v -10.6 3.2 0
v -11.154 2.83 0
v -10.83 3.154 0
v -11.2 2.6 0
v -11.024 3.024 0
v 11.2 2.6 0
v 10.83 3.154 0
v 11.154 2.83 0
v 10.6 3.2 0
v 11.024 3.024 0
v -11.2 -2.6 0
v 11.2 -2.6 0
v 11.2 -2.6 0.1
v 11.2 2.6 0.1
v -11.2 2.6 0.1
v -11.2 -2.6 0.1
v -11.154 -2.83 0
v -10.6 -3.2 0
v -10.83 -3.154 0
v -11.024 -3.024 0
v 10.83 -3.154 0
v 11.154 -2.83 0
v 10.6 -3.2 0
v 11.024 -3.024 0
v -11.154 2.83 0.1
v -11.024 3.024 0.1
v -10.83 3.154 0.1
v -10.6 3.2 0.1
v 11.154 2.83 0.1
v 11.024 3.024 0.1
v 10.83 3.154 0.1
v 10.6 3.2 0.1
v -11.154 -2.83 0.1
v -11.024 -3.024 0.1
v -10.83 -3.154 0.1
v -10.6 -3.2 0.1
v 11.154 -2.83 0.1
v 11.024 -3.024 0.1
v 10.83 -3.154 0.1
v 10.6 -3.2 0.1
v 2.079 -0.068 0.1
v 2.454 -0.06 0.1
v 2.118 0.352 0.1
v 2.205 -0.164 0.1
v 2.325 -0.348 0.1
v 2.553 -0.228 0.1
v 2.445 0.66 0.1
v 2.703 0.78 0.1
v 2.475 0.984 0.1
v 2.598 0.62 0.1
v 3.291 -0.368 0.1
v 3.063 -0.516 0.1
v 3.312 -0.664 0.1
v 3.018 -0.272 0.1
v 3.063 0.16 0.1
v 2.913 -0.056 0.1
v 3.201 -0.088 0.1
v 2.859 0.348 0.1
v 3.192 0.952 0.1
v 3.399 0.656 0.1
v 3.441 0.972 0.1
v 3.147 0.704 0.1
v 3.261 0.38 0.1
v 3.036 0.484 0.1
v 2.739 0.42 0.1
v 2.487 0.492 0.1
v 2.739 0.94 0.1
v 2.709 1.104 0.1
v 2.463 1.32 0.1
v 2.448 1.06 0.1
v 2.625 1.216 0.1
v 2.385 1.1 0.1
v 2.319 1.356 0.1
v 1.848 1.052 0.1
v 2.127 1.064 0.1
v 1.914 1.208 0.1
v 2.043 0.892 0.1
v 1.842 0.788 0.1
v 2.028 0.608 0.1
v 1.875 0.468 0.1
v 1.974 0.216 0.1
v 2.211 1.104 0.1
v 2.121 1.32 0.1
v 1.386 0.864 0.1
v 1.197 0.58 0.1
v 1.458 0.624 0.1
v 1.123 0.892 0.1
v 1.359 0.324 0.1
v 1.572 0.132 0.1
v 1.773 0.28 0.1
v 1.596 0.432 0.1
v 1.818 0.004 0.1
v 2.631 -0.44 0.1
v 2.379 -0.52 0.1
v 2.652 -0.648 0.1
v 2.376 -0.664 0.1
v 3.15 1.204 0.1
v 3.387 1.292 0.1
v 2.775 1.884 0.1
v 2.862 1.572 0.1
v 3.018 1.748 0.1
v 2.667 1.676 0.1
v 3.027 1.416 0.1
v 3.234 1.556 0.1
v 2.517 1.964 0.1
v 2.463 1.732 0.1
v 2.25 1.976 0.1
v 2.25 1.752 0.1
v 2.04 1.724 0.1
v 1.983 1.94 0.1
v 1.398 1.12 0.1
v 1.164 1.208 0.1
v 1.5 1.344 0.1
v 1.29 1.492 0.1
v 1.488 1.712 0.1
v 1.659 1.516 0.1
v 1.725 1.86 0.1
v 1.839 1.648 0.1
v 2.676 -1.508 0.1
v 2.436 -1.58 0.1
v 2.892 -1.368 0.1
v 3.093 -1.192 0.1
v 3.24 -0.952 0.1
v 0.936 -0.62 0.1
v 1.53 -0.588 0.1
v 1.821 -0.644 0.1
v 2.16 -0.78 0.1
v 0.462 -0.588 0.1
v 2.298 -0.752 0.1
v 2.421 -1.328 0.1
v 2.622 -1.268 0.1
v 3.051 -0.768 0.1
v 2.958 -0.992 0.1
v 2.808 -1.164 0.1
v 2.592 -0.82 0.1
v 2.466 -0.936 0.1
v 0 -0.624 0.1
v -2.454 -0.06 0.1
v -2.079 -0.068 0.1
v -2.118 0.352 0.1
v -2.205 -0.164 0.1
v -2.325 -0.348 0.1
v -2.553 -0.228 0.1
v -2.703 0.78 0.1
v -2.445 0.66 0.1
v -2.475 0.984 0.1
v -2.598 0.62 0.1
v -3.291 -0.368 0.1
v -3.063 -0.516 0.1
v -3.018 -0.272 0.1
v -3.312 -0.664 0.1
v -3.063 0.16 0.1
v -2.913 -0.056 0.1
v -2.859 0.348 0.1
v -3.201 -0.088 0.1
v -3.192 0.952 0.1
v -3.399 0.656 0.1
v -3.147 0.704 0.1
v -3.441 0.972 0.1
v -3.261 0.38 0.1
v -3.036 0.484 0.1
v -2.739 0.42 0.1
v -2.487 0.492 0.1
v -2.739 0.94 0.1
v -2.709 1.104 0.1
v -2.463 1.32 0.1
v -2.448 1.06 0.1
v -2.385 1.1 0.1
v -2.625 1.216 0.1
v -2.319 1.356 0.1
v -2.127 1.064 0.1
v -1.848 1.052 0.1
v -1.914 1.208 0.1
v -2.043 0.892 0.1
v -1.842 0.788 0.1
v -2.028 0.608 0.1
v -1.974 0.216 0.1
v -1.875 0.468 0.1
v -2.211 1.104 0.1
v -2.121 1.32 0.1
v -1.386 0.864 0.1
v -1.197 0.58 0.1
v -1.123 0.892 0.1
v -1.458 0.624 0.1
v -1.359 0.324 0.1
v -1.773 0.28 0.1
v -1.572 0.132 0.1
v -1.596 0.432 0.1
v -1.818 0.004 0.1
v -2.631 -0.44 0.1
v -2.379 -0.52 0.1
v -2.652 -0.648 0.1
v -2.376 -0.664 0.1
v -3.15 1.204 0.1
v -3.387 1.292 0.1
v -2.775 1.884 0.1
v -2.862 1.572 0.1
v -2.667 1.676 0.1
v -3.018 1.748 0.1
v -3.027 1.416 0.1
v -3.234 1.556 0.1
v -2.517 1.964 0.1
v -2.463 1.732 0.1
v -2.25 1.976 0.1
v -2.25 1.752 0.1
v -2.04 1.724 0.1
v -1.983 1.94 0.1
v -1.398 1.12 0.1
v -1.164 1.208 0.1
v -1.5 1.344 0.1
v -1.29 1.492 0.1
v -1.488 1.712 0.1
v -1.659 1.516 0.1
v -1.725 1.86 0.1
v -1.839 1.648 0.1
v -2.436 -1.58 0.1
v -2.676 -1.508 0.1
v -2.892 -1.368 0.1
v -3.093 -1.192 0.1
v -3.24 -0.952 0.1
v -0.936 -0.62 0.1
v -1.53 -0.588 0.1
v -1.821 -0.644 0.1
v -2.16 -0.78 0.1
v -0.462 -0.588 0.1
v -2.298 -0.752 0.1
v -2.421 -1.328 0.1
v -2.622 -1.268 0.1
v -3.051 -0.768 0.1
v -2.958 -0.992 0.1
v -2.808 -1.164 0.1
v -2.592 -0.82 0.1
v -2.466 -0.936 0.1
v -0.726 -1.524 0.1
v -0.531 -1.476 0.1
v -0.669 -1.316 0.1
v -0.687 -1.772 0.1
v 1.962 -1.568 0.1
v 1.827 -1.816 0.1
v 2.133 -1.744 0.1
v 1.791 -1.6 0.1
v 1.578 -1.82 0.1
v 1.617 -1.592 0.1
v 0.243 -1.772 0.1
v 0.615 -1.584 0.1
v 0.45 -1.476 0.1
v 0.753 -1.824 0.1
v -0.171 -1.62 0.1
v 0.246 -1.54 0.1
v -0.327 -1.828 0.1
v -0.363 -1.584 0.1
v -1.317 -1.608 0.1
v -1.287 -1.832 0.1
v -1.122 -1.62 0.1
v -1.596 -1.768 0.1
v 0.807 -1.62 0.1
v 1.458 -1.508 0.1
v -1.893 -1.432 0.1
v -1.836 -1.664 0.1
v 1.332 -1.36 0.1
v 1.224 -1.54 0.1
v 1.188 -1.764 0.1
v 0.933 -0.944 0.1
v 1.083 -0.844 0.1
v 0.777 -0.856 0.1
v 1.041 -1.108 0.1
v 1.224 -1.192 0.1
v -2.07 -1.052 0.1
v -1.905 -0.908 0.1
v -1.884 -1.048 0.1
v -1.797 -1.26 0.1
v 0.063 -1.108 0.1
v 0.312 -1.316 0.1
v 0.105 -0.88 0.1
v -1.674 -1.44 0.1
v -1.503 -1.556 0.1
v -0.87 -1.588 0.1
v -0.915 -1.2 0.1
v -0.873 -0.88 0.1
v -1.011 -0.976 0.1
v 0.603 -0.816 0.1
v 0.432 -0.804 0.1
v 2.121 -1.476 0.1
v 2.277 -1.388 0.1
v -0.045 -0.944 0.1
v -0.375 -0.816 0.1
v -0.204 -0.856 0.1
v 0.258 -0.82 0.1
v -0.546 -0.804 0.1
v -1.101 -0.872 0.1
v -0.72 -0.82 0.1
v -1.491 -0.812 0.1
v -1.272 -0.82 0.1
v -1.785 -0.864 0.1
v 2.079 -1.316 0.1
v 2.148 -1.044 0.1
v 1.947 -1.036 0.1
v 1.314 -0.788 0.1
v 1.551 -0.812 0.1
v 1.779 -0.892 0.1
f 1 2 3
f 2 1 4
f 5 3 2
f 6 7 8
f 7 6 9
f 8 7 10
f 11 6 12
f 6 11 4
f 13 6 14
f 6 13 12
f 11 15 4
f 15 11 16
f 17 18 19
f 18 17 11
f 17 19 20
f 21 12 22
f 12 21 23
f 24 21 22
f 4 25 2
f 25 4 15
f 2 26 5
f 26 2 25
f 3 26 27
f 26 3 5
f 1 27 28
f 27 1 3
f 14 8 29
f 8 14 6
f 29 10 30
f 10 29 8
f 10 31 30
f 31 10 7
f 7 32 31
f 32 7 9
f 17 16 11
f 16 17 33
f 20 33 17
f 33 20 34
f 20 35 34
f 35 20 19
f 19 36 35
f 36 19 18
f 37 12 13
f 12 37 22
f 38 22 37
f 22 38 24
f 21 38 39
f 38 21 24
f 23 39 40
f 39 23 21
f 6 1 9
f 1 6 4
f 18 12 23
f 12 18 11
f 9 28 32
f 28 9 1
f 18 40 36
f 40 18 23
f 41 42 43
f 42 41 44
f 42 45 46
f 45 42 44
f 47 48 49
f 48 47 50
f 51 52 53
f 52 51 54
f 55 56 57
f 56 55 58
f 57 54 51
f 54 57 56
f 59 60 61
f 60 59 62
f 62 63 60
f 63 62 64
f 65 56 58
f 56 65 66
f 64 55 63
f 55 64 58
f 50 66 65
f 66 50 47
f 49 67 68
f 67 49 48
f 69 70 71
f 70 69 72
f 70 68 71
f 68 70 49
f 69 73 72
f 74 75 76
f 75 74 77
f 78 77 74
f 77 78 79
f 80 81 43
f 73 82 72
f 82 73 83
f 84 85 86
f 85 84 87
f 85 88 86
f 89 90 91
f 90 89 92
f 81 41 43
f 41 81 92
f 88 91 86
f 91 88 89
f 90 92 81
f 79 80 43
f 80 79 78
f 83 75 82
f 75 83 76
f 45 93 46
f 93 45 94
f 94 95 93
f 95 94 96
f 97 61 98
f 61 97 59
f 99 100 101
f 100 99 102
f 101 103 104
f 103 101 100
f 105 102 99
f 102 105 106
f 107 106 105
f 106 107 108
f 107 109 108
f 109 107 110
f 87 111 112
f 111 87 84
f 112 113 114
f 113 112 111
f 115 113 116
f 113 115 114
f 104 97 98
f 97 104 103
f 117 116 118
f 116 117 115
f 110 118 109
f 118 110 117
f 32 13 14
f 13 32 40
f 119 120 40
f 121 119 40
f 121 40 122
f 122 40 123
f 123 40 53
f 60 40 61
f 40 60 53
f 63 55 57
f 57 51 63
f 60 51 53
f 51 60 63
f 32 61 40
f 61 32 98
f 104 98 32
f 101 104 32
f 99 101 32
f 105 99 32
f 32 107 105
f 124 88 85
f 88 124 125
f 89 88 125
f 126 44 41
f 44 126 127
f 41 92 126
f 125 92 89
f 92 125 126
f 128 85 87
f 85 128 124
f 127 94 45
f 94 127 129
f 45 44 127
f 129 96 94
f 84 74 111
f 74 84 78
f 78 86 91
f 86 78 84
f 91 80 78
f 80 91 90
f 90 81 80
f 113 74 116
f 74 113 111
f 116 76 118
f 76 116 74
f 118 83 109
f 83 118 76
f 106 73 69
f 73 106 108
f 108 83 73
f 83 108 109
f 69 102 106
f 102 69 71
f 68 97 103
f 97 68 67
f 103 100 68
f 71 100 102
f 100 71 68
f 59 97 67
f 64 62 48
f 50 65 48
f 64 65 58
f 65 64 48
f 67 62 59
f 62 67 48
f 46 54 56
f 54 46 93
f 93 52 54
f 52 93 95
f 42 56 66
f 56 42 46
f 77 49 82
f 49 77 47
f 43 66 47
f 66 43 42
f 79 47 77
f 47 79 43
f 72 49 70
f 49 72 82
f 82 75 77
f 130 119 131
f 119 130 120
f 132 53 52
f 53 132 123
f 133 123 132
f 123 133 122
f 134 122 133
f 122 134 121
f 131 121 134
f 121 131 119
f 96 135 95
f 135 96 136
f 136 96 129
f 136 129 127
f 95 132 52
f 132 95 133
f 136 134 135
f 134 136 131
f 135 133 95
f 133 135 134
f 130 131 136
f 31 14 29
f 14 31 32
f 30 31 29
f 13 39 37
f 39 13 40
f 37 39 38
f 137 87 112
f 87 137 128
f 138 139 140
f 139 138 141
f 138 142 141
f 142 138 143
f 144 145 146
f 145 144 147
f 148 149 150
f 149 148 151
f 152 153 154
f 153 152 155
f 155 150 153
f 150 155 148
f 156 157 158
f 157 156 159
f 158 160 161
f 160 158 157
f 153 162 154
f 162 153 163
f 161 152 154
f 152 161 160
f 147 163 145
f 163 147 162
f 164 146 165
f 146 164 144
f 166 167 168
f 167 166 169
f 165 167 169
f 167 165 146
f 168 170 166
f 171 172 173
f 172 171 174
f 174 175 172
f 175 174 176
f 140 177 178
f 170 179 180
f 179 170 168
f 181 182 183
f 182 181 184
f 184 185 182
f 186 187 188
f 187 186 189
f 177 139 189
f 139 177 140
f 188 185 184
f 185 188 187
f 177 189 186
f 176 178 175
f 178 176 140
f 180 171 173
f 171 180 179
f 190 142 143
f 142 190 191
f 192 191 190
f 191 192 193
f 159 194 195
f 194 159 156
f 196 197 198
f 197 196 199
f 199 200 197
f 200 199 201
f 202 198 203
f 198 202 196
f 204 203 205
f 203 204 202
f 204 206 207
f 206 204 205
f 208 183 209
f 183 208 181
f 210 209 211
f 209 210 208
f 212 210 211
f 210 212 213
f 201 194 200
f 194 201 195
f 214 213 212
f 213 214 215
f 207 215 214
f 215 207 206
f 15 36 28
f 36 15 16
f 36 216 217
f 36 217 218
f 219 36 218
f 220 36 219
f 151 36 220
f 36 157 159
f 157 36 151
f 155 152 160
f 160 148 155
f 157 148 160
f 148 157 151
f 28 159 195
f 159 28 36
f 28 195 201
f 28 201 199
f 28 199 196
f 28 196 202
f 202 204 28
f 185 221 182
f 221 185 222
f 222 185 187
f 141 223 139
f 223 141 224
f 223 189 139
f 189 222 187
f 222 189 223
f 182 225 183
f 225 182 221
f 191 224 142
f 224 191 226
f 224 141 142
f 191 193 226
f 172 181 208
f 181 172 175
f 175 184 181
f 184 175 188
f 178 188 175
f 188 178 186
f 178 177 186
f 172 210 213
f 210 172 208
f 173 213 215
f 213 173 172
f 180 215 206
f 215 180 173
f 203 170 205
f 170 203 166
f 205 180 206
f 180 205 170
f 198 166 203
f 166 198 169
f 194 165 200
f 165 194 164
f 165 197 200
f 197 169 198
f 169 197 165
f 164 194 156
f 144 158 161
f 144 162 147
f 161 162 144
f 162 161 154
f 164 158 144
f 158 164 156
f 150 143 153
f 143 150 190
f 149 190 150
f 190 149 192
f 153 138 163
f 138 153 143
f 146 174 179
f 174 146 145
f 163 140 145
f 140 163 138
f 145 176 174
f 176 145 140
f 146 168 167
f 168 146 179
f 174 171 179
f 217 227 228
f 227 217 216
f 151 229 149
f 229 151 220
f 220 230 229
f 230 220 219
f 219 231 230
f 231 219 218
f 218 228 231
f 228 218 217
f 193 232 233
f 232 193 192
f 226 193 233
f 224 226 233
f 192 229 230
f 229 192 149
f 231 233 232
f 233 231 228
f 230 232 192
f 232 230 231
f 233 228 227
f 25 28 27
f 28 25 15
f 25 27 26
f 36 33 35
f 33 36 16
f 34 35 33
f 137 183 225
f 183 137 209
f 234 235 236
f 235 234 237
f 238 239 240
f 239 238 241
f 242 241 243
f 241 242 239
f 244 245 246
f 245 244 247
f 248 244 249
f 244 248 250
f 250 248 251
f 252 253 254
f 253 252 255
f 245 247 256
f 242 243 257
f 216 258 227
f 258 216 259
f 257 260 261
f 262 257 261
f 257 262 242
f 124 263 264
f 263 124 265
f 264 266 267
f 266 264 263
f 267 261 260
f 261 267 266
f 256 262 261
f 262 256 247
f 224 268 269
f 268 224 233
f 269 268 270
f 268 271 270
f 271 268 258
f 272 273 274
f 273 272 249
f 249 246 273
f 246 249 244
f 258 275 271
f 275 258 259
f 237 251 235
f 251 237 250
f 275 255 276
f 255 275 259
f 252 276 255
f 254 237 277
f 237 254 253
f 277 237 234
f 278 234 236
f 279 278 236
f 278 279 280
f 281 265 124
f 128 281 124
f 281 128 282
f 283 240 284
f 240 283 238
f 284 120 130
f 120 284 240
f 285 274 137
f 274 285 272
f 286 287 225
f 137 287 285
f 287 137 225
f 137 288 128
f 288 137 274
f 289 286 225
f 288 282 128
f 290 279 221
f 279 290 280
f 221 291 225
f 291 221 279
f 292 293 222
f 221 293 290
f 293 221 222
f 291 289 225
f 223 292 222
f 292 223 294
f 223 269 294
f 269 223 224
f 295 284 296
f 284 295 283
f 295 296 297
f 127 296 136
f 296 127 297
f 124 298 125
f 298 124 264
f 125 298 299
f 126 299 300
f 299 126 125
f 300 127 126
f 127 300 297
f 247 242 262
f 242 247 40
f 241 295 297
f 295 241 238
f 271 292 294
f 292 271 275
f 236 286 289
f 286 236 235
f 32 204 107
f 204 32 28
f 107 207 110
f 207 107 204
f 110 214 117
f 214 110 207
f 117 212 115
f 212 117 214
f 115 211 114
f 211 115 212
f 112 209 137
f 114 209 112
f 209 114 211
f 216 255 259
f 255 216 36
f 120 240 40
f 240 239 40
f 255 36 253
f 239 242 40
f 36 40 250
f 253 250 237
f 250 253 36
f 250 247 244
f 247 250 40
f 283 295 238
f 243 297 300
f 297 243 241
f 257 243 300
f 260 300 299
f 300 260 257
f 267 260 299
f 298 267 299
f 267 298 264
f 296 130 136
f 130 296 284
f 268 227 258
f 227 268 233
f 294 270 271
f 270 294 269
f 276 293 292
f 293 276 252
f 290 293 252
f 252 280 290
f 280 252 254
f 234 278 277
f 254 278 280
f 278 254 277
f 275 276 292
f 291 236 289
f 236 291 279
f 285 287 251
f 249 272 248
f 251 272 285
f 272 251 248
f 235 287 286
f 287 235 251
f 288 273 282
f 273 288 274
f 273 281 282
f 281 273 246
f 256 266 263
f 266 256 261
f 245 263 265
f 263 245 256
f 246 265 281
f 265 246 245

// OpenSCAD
// file: ../p/box3u12.scad
use <../lib.scad>
function ldraw_lib__box3u12() = [
// 0 Box with 3 Parallel Faces without Any Edges
// 0 Name: box3u12.dat
// 0 Author: J.C. Tchang [tchang]
// 0 !LDRAW_ORG Primitive UPDATE 2014-02
// 0 !LICENSE Licensed under CC BY 4.0 : see CAreadme.txt
// 
// 0 BFC CERTIFY CCW
  [0,"BFC","CERTIFY"],
  [0,"BFC","CCW"],
// 
// 0 !HISTORY 2014-12-23 [PTadmin] Official Update 2014-02
// 
// 
// 4 16 -1 1 1 1 1 1 1 1 -1 -1 1 -1
  [4,16,-1,1,1,1,1,1,1,1,-1,-1,1,-1],
// 4 16 -1 1 1 -1 0 1 1 0 1 1 1 1
  [4,16,-1,1,1,-1,0,1,1,0,1,1,1,1],
// 4 16 1 1 -1 1 0 -1 -1 0 -1 -1 1 -1
  [4,16,1,1,-1,1,0,-1,-1,0,-1,-1,1,-1],
];
module ldraw_lib__box3u12(step=0, col=false, unit=2/5, alt=false, line=0.2, solid=!$preview)
    makepoly(ldraw_lib__box3u12(), step=step, col=col, unit=unit, alt=alt, line=line, solid=solid);
ldraw_lib__box3u12(line=0.2);
// file: ../p/1-4cyli.scad
use <../lib.scad>
function ldraw_lib__1_4cyli() = [
// 0 Cylinder 0.25
// 0 Name: 1-4cyli.dat
// 0 Author: James Jessiman
// 0 !LDRAW_ORG Primitive UPDATE 2012-01
// 0 !LICENSE Licensed under CC BY 4.0 : see CAreadme.txt
// 
// 0 BFC CERTIFY CCW
  [0,"BFC","CERTIFY"],
  [0,"BFC","CCW"],
// 
// 0 !HISTORY 2002-03-23 [sbliss] Added BFC statement.
// 0 !HISTORY 2002-04-25 [PTadmin] Official Update 2002-02
// 0 !HISTORY 2007-06-22 [PTadmin] Header formatted for Contributor Agreement
// 0 !HISTORY 2008-07-01 [PTadmin] Official Update 2008-01
// 0 !HISTORY 2012-02-16 [Philo] Changed to CCW
// 0 !HISTORY 2012-03-30 [PTadmin] Official Update 2012-01
// 
// 
// 4 16 1 1 0 0.9239 1 0.3827 0.9239 0 0.3827 1 0 0
  [4,16,1,1,0,0.9239,1,0.3827,0.9239,0,0.3827,1,0,0],
// 5 24 1 0 0 1 1 0 0.9239 0 0.3827 1 0 -1
  [5,24,1,0,0,1,1,0,0.9239,0,0.3827,1,0,-1],
// 4 16 0.9239 1 0.3827 0.7071 1 0.7071 0.7071 0 0.7071 0.9239 0 0.3827
  [4,16,0.9239,1,0.3827,0.7071,1,0.7071,0.7071,0,0.7071,0.9239,0,0.3827],
// 5 24 0.9239 0 0.3827 0.9239 1 0.3827 0.7071 0 0.7071 1 0 0
  [5,24,0.9239,0,0.3827,0.9239,1,0.3827,0.7071,0,0.7071,1,0,0],
// 4 16 0.7071 1 0.7071 0.3827 1 0.9239 0.3827 0 0.9239 0.7071 0 0.7071
  [4,16,0.7071,1,0.7071,0.3827,1,0.9239,0.3827,0,0.9239,0.7071,0,0.7071],
// 5 24 0.7071 0 0.7071 0.7071 1 0.7071 0.3827 0 0.9239 0.9239 0 0.3827
  [5,24,0.7071,0,0.7071,0.7071,1,0.7071,0.3827,0,0.9239,0.9239,0,0.3827],
// 4 16 0.3827 1 0.9239 0 1 1 0 0 1 0.3827 0 0.9239
  [4,16,0.3827,1,0.9239,0,1,1,0,0,1,0.3827,0,0.9239],
// 5 24 0.3827 0 0.9239 0.3827 1 0.9239 0 0 1 0.7071 0 0.7071
  [5,24,0.3827,0,0.9239,0.3827,1,0.9239,0,0,1,0.7071,0,0.7071],
// 5 24 0 0 1 0 1 1 0.3827 0 0.9239 -1 0 1
  [5,24,0,0,1,0,1,1,0.3827,0,0.9239,-1,0,1],
];
module ldraw_lib__1_4cyli(step=0, col=false, unit=2/5, alt=false, line=0.2, solid=!$preview)
    makepoly(ldraw_lib__1_4cyli(), step=step, col=col, unit=unit, alt=alt, line=line, solid=solid);
ldraw_lib__1_4cyli(line=0.2);
// file: ../p/1-4chrd.scad
use <../lib.scad>
function ldraw_lib__1_4chrd() = [
// 0 Chord 0.25
// 0 Name: 1-4chrd.dat
// 0 Author: Max Martin Richter [MMR1988]
// 0 !LDRAW_ORG Primitive UPDATE 2023-05
// 0 !LICENSE Licensed under CC BY 4.0 : see CAreadme.txt
// 
// 0 BFC CERTIFY CCW
  [0,"BFC","CERTIFY"],
  [0,"BFC","CCW"],
// 
// 0 !HISTORY 2004-04-22 [PTadmin] Official Update 2004-02
// 0 !HISTORY 2007-10-09 [PTadmin] Header formatted for Contributor Agreement
// 0 !HISTORY 2008-07-01 [PTadmin] Official Update 2008-01
// 0 !HISTORY 2012-08-02 [MMR1988] Re-creation with PrimGen2 and Rectifier
// 0 !HISTORY 2012-08-09 [PTadmin] Official Update 2012-02
// 0 !HISTORY 2023-10-27 [OrionP] Change author to MMR1988 from hafhead
// 0 !HISTORY 2023-10-31 [OrionP] Official Update 2023-05
// 
// 4 16 0.9239 0 0.3827 0.3827 0 0.9239 0 0 1 1 0 0
  [4,16,0.9239,0,0.3827,0.3827,0,0.9239,0,0,1,1,0,0],
// 3 16 0.7071 0 0.7071 0.3827 0 0.9239 0.9239 0 0.3827
  [3,16,0.7071,0,0.7071,0.3827,0,0.9239,0.9239,0,0.3827],
];
module ldraw_lib__1_4chrd(step=0, col=false, unit=2/5, alt=false, line=0.2, solid=!$preview)
    makepoly(ldraw_lib__1_4chrd(), step=step, col=col, unit=unit, alt=alt, line=line, solid=solid);
ldraw_lib__1_4chrd(line=0.2);
// file: s/stickerback008x028.scad
use <../../lib.scad>
use <../../p/1-4chrd.scad>
use <../../p/1-4cyli.scad>
use <../../p/box3u12.scad>
function ldraw_lib__s__stickerback008x028() = [
// 0 ~Sticker Back  0.8 x  2.8
// 0 Name: s\stickerback008x028.dat
// 0 Author: Massimo Maso [Sirio]
// 0 !LDRAW_ORG Subpart UPDATE 2025-08
// 0 !LICENSE Licensed under CC BY 4.0 : see CAreadme.txt
// 
// 0 BFC CERTIFY CCW
  [0,"BFC","CERTIFY"],
  [0,"BFC","CCW"],
// 
// 0 !HISTORY 2025-08-31 [OrionP] Official Update 2025-08
// 
// 0 // Primitives
// 1 16 -26.5 0 6.5 -1.5 0 0 0 -1 0 0 0 1.5 1-4chrd.dat
  [1,16,-26.5,0,6.5,-1.5,0,0,0,-1,0,0,0,1.5, ldraw_lib__1_4chrd()],
// 1 16 26.5 0 6.5 1.5 0 0 0 -1 0 0 0 1.5 1-4chrd.dat
  [1,16,26.5,0,6.5,1.5,0,0,0,-1,0,0,0,1.5, ldraw_lib__1_4chrd()],
// 1 16 0 -.25 0 0 0 28 0 .25 0 6.5 0 0 box3u12.dat
  [1,16,0,-.25,0,0,0,28,0,.25,0,6.5,0,0, ldraw_lib__box3u12()],
// 1 16 -26.5 0 -6.5 -1.5 0 0 0 -1 0 0 0 -1.5 1-4chrd.dat
  [1,16,-26.5,0,-6.5,-1.5,0,0,0,-1,0,0,0,-1.5, ldraw_lib__1_4chrd()],
// 1 16 26.5 0 -6.5 1.5 0 0 0 -1 0 0 0 -1.5 1-4chrd.dat
  [1,16,26.5,0,-6.5,1.5,0,0,0,-1,0,0,0,-1.5, ldraw_lib__1_4chrd()],
// 1 16 -26.5 -.25 6.5 -1.5 0 0 0 .25 0 0 0 1.5 1-4cyli.dat
  [1,16,-26.5,-.25,6.5,-1.5,0,0,0,.25,0,0,0,1.5, ldraw_lib__1_4cyli()],
// 1 16 26.5 -.25 6.5 1.5 0 0 0 .25 0 0 0 1.5 1-4cyli.dat
  [1,16,26.5,-.25,6.5,1.5,0,0,0,.25,0,0,0,1.5, ldraw_lib__1_4cyli()],
// 1 16 -26.5 -.25 -6.5 -1.5 0 0 0 .25 0 0 0 -1.5 1-4cyli.dat
  [1,16,-26.5,-.25,-6.5,-1.5,0,0,0,.25,0,0,0,-1.5, ldraw_lib__1_4cyli()],
// 1 16 26.5 -.25 -6.5 1.5 0 0 0 .25 0 0 0 -1.5 1-4cyli.dat
  [1,16,26.5,-.25,-6.5,1.5,0,0,0,.25,0,0,0,-1.5, ldraw_lib__1_4cyli()],
// 0 // Bottom face
// 4 16 -28 0 6.5 -26.5 0 8 26.5 0 8 28 0 6.5
  [4,16,-28,0,6.5,-26.5,0,8,26.5,0,8,28,0,6.5],
// 4 16 -28 0 -6.5 28 0 -6.5 26.5 0 -8 -26.5 0 -8
  [4,16,-28,0,-6.5,28,0,-6.5,26.5,0,-8,-26.5,0,-8],
// 0 // Lateral face
// 4 16 26.5 0 8 -26.5 0 8 -26.5 -.25 8 26.5 -.25 8
  [4,16,26.5,0,8,-26.5,0,8,-26.5,-.25,8,26.5,-.25,8],
// 4 16 -26.5 0 -8 26.5 0 -8 26.5 -.25 -8 -26.5 -.25 -8
  [4,16,-26.5,0,-8,26.5,0,-8,26.5,-.25,-8,-26.5,-.25,-8],
];
module ldraw_lib__s__stickerback008x028(step=0, col=false, unit=2/5, alt=false, line=0.2, solid=!$preview)
    makepoly(ldraw_lib__s__stickerback008x028(), step=step, col=col, unit=unit, alt=alt, line=line, solid=solid);
ldraw_lib__s__stickerback008x028(line=0.2);
// main file
use <../lib.scad>
use <s/6521012as01.scad>
use <s/stickerback008x028.scad>
function ldraw_lib__6521012a() = [
// 0 Sticker  0.8 x  2.8 with Medium Nougat Drawer with Ornamented Gold Handle
// 0 Name: 6521012a.dat
// 0 Author: Philippe Hurbain [Philo]
// 0 !LDRAW_ORG Part UPDATE 2026-07
// 0 !LICENSE Licensed under CC BY 4.0 : see CAreadme.txt
// 
// 0 BFC CERTIFY CCW
  [0,"BFC","CERTIFY"],
  [0,"BFC","CCW"],
// 
// 0 !CATEGORY Sticker
// 0 !KEYWORDS Beekeepers' House and Flower Garden, BrickLink 42669stk01
// 0 !KEYWORDS Brickowl 447019, Rebrickable 10110453, Set 42669
// 
// 0 !HISTORY 2026-07-30 [OrionP] Official Update 2026-07
// 
// 1 16 0 0 0 1 0 0 0 1 0 0 0 1 s\stickerback008x028.dat
  [1,16,0,0,0,1,0,0,0,1,0,0,0,1, ldraw_lib__s__stickerback008x028()],
// 1 16 0 0 0 1 0 0 0 1 0 0 0 1 s\6521012as01.dat
  [1,16,0,0,0,1,0,0,0,1,0,0,0,1, ldraw_lib__s__6521012as01()],
// 1 16 0 0 0 -1 0 0 0 1 0 0 0 1 s\6521012as01.dat
  [1,16,0,0,0,-1,0,0,0,1,0,0,0,1, ldraw_lib__s__6521012as01()],
// 
// 4 272 -1.7175 -.25 -4.43 -1.3275 -.25 -3.69 -1.6725 -.25 -3.29 -1.815 -.25 -3.81
  [4,272,-1.7175,-.25,-4.43,-1.3275,-.25,-3.69,-1.6725,-.25,-3.29,-1.815,-.25,-3.81],
// 4 272 4.4775 -.25 -4 4.5675 -.25 -4.54 5.3325 -.25 -4.36 4.905 -.25 -3.92
  [4,272,4.4775,-.25,-4,4.5675,-.25,-4.54,5.3325,-.25,-4.36,4.905,-.25,-3.92],
// 4 272 4.5675 -.25 -4.54 4.4775 -.25 -4 4.0425 -.25 -3.98 3.945 -.25 -4.55
  [4,272,4.5675,-.25,-4.54,4.4775,-.25,-4,4.0425,-.25,-3.98,3.945,-.25,-4.55],
// 4 272 1.125 -.25 -3.69 .6075 -.25 -4.43 1.8825 -.25 -4.56 1.5375 -.25 -3.96
  [4,272,1.125,-.25,-3.69,.6075,-.25,-4.43,1.8825,-.25,-4.56,1.5375,-.25,-3.96],
// 4 272 .615 -.25 -3.85 -.4275 -.25 -4.05 -.8175 -.25 -4.57 .6075 -.25 -4.43
  [4,272,.615,-.25,-3.85,-.4275,-.25,-4.05,-.8175,-.25,-4.57,.6075,-.25,-4.43],
// 3 272 -.8175 -.25 -4.57 -.4275 -.25 -4.05 -.9075 -.25 -3.96
  [3,272,-.8175,-.25,-4.57,-.4275,-.25,-4.05,-.9075,-.25,-3.96],
// 4 272 -3.99 -.25 -4.42 -3.2175 -.25 -4.58 -2.805 -.25 -4.05 -3.2925 -.25 -4.02
  [4,272,-3.99,-.25,-4.42,-3.2175,-.25,-4.58,-2.805,-.25,-4.05,-3.2925,-.25,-4.02],
// 3 272 1.5375 -.25 -3.96 1.8825 -.25 -4.56 2.0175 -.25 -4.05
  [3,272,1.5375,-.25,-3.96,1.8825,-.25,-4.56,2.0175,-.25,-4.05],
// 3 272 3.945 -.25 -4.55 4.0425 -.25 -3.98 3.645 -.25 -3.77
  [3,272,3.945,-.25,-4.55,4.0425,-.25,-3.98,3.645,-.25,-3.77],
// 4 272 -4.59 -.25 -4.16 -4.7325 -.25 -3.58 -6.0525 -.25 -3.32 -6.09 -.25 -3.95
  [4,272,-4.59,-.25,-4.16,-4.7325,-.25,-3.58,-6.0525,-.25,-3.32,-6.09,-.25,-3.95],
// 3 272 3.645 -.25 -3.77 3.33 -.25 -3.4 3.06 -.25 -3.85
  [3,272,3.645,-.25,-3.77,3.33,-.25,-3.4,3.06,-.25,-3.85],
// 4 272 3.945 -.25 -4.55 3.645 -.25 -3.77 3.06 -.25 -3.85 2.97 -.25 -4.41
  [4,272,3.945,-.25,-4.55,3.645,-.25,-3.77,3.06,-.25,-3.85,2.97,-.25,-4.41],
// 4 272 2.34 -.25 -1.55 1.9425 -.25 -2.14 2.3325 -.25 -2.36 2.7075 -.25 -2.11
  [4,272,2.34,-.25,-1.55,1.9425,-.25,-2.14,2.3325,-.25,-2.36,2.7075,-.25,-2.11],
// 4 272 2.3325 -.25 -2.36 2.6025 -.25 -2.77 3.06 -.25 -2.98 2.7075 -.25 -2.11
  [4,272,2.3325,-.25,-2.36,2.6025,-.25,-2.77,3.06,-.25,-2.98,2.7075,-.25,-2.11],
// 4 272 2.6025 -.25 -2.77 3.06 -.25 -3.85 3.33 -.25 -3.4 3.06 -.25 -2.98
  [4,272,2.6025,-.25,-2.77,3.06,-.25,-3.85,3.33,-.25,-3.4,3.06,-.25,-2.98],
// 4 272 1.8825 -.25 -4.56 2.97 -.25 -4.41 3.06 -.25 -3.85 2.0175 -.25 -4.05
  [4,272,1.8825,-.25,-4.56,2.97,-.25,-4.41,3.06,-.25,-3.85,2.0175,-.25,-4.05],
// 4 272 -5.4 -.25 -1.95 -6.165 -.25 -2.34 -5.175 -.25 -2.63 -4.7625 -.25 -2.27
  [4,272,-5.4,-.25,-1.95,-6.165,-.25,-2.34,-5.175,-.25,-2.63,-4.7625,-.25,-2.27],
// 3 272 -4.7625 -.25 -2.27 -5.175 -.25 -2.63 -4.71 -.25 -2.62
  [3,272,-4.7625,-.25,-2.27,-5.175,-.25,-2.63,-4.71,-.25,-2.62],
// 4 272 -5.175 -.25 -2.63 -4.7325 -.25 -3.58 -4.4925 -.25 -3.15 -4.71 -.25 -2.62
  [4,272,-5.175,-.25,-2.63,-4.7325,-.25,-3.58,-4.4925,-.25,-3.15,-4.71,-.25,-2.62],
// 4 272 .2625 -.25 -2.2 .1575 -.25 -2.77 .615 -.25 -3.85 .78 -.25 -3.29
  [4,272,.2625,-.25,-2.2,.1575,-.25,-2.77,.615,-.25,-3.85,.78,-.25,-3.29],
// 4 272 .78 -.25 -3.29 .615 -.25 -3.85 .6075 -.25 -4.43 1.125 -.25 -3.69
  [4,272,.78,-.25,-3.29,.615,-.25,-3.85,.6075,-.25,-4.43,1.125,-.25,-3.69],
// 4 272 -4.59 -.25 -4.16 -4.185 -.25 -3.6 -4.4925 -.25 -3.15 -4.7325 -.25 -3.58
  [4,272,-4.59,-.25,-4.16,-4.185,-.25,-3.6,-4.4925,-.25,-3.15,-4.7325,-.25,-3.58],
// 4 272 -.8175 -.25 -4.57 -.9075 -.25 -3.96 -1.3275 -.25 -3.69 -1.7175 -.25 -4.43
  [4,272,-.8175,-.25,-4.57,-.9075,-.25,-3.96,-1.3275,-.25,-3.69,-1.7175,-.25,-4.43],
// 4 272 -4.59 -.25 -4.16 -3.99 -.25 -4.42 -3.7575 -.25 -3.89 -4.185 -.25 -3.6
  [4,272,-4.59,-.25,-4.16,-3.99,-.25,-4.42,-3.7575,-.25,-3.89,-4.185,-.25,-3.6],
// 3 272 -3.2925 -.25 -4.02 -3.7575 -.25 -3.89 -3.99 -.25 -4.42
  [3,272,-3.2925,-.25,-4.02,-3.7575,-.25,-3.89,-3.99,-.25,-4.42],
// 4 272 -3.2175 -.25 -4.58 -1.7175 -.25 -4.43 -2.175 -.25 -3.97 -2.805 -.25 -4.05
  [4,272,-3.2175,-.25,-4.58,-1.7175,-.25,-4.43,-2.175,-.25,-3.97,-2.805,-.25,-4.05],
// 3 272 -2.175 -.25 -3.97 -1.7175 -.25 -4.43 -1.815 -.25 -3.81
  [3,272,-2.175,-.25,-3.97,-1.7175,-.25,-4.43,-1.815,-.25,-3.81],
// 3 272 -2.2875 -.25 -3 -1.815 -.25 -3.81 -1.6725 -.25 -3.29
  [3,272,-2.2875,-.25,-3,-1.815,-.25,-3.81,-1.6725,-.25,-3.29],
// 4 272 -2.5275 -.25 -2.44 -2.2875 -.25 -3 -1.6725 -.25 -3.29 -2.1825 -.25 -2.2
  [4,272,-2.5275,-.25,-2.44,-2.2875,-.25,-3,-1.6725,-.25,-3.29,-2.1825,-.25,-2.2],
// 3 272 1.5075 -.25 -2.04 1.9425 -.25 -2.14 2.34 -.25 -1.55
  [3,272,1.5075,-.25,-2.04,1.9425,-.25,-2.14,2.34,-.25,-1.55],
// 4 272 1.08 -.25 -2.01 1.5075 -.25 -2.04 2.34 -.25 -1.55 1.155 -.25 -1.47
  [4,272,1.08,-.25,-2.01,1.5075,-.25,-2.04,2.34,-.25,-1.55,1.155,-.25,-1.47],
// 4 272 4.905 -.25 -3.92 5.3325 -.25 -4.36 5.6925 -.25 -3.47 5.3025 -.25 -3.69
  [4,272,4.905,-.25,-3.92,5.3325,-.25,-4.36,5.6925,-.25,-3.47,5.3025,-.25,-3.69],
// 4 272 6.09 -.25 -3.95 6.0525 -.25 -3.32 5.6925 -.25 -3.47 5.3325 -.25 -4.36
  [4,272,6.09,-.25,-3.95,6.0525,-.25,-3.32,5.6925,-.25,-3.47,5.3325,-.25,-4.36],
// 4 272 .1575 -.25 -2.77 .2625 -.25 -2.2 0 -.25 -1.56 -.1125 -.25 -2.36
  [4,272,.1575,-.25,-2.77,.2625,-.25,-2.2,0,-.25,-1.56,-.1125,-.25,-2.36],
// 3 272 -.9375 -.25 -2.04 -.51 -.25 -2.14 -1.155 -.25 -1.47
  [3,272,-.9375,-.25,-2.04,-.51,-.25,-2.14,-1.155,-.25,-1.47],
// 4 272 -.1125 -.25 -2.36 0 -.25 -1.56 -1.155 -.25 -1.47 -.51 -.25 -2.14
  [4,272,-.1125,-.25,-2.36,0,-.25,-1.56,-1.155,-.25,-1.47,-.51,-.25,-2.14],
// 4 272 1.155 -.25 -1.47 0 -.25 -1.56 .2625 -.25 -2.2 .645 -.25 -2.05
  [4,272,1.155,-.25,-1.47,0,-.25,-1.56,.2625,-.25,-2.2,.645,-.25,-2.05],
// 3 272 -1.365 -.25 -2.01 -.9375 -.25 -2.04 -1.155 -.25 -1.47
  [3,272,-1.365,-.25,-2.01,-.9375,-.25,-2.04,-1.155,-.25,-1.47],
// 3 272 .645 -.25 -2.05 1.08 -.25 -2.01 1.155 -.25 -1.47
  [3,272,.645,-.25,-2.05,1.08,-.25,-2.01,1.155,-.25,-1.47],
// 4 272 -2.5275 -.25 -2.44 -2.1825 -.25 -2.2 -2.34 -.25 -1.55 -2.7525 -.25 -2.18
  [4,272,-2.5275,-.25,-2.44,-2.1825,-.25,-2.2,-2.34,-.25,-1.55,-2.7525,-.25,-2.18],
// 4 272 -1.155 -.25 -1.47 -2.34 -.25 -1.55 -2.1825 -.25 -2.2 -1.8 -.25 -2.05
  [4,272,-1.155,-.25,-1.47,-2.34,-.25,-1.55,-2.1825,-.25,-2.2,-1.8,-.25,-2.05],
// 3 272 -3.7275 -.25 -2.03 -3.18 -.25 -2.05 -3.825 -.25 -1.47
  [3,272,-3.7275,-.25,-2.03,-3.18,-.25,-2.05,-3.825,-.25,-1.47],
// 4 272 -2.7525 -.25 -2.18 -2.34 -.25 -1.55 -3.825 -.25 -1.47 -3.18 -.25 -2.05
  [4,272,-2.7525,-.25,-2.18,-2.34,-.25,-1.55,-3.825,-.25,-1.47,-3.18,-.25,-2.05],
// 3 272 -1.8 -.25 -2.05 -1.365 -.25 -2.01 -1.155 -.25 -1.47
  [3,272,-1.8,-.25,-2.05,-1.365,-.25,-2.01,-1.155,-.25,-1.47],
// 4 272 -4.5525 -.25 -1.61 -4.4625 -.25 -2.16 -3.7275 -.25 -2.03 -3.825 -.25 -1.47
  [4,272,-4.5525,-.25,-1.61,-4.4625,-.25,-2.16,-3.7275,-.25,-2.03,-3.825,-.25,-1.47],
// 4 272 -4.4625 -.25 -2.16 -4.5525 -.25 -1.61 -5.4 -.25 -1.95 -4.7625 -.25 -2.27
  [4,272,-4.4625,-.25,-2.16,-4.5525,-.25,-1.61,-5.4,-.25,-1.95,-4.7625,-.25,-2.27],
// 4 272 5.37 -.25 -2.61 5.1975 -.25 -3.29 5.3025 -.25 -3.69 5.6925 -.25 -3.47
  [4,272,5.37,-.25,-2.61,5.1975,-.25,-3.29,5.3025,-.25,-3.69,5.6925,-.25,-3.47],
// 3 272 5.1975 -.25 -3.29 5.37 -.25 -2.61 4.8675 -.25 -2.59
  [3,272,5.1975,-.25,-3.29,5.37,-.25,-2.61,4.8675,-.25,-2.59],
// 4 272 6.165 -.25 -2.34 5.4 -.25 -1.95 4.8675 -.25 -2.59 5.37 -.25 -2.61
  [4,272,6.165,-.25,-2.34,5.4,-.25,-1.95,4.8675,-.25,-2.59,5.37,-.25,-2.61],
// 4 272 2.7075 -.25 -2.11 3.285 -.25 -1.97 3.825 -.25 -1.47 2.34 -.25 -1.55
  [4,272,2.7075,-.25,-2.11,3.285,-.25,-1.97,3.825,-.25,-1.47,2.34,-.25,-1.55],
// 3 272 3.825 -.25 -1.47 3.285 -.25 -1.97 3.8775 -.25 -2.03
  [3,272,3.825,-.25,-1.47,3.285,-.25,-1.97,3.8775,-.25,-2.03],
// 4 272 3.825 -.25 -1.47 3.8775 -.25 -2.03 4.4475 -.25 -2.23 4.5525 -.25 -1.61
  [4,272,3.825,-.25,-1.47,3.8775,-.25,-2.03,4.4475,-.25,-2.23,4.5525,-.25,-1.61],
// 4 272 5.4 -.25 -1.95 4.5525 -.25 -1.61 4.4475 -.25 -2.23 4.8675 -.25 -2.59
  [4,272,5.4,-.25,-1.95,4.5525,-.25,-1.61,4.4475,-.25,-2.23,4.8675,-.25,-2.59],
// 4 84 2.97 -.25 -4.41 1.8825 -.25 -4.56 26.5 -.25 -8 3.945 -.25 -4.55
  [4,84,2.97,-.25,-4.41,1.8825,-.25,-4.56,26.5,-.25,-8,3.945,-.25,-4.55],
// 4 82 4.4775 -.25 -4 4.905 -.25 -3.92 5.1975 -.25 -3.29 4.8675 -.25 -2.59
  [4,82,4.4775,-.25,-4,4.905,-.25,-3.92,5.1975,-.25,-3.29,4.8675,-.25,-2.59],
// 4 82 -4.4625 -.25 -2.16 -4.4925 -.25 -3.15 -4.185 -.25 -3.6 -3.7275 -.25 -2.03
  [4,82,-4.4625,-.25,-2.16,-4.4925,-.25,-3.15,-4.185,-.25,-3.6,-3.7275,-.25,-2.03],
// 4 82 -1.365 -.25 -2.01 -1.6725 -.25 -3.29 -1.3275 -.25 -3.69 -.9375 -.25 -2.04
  [4,82,-1.365,-.25,-2.01,-1.6725,-.25,-3.29,-1.3275,-.25,-3.69,-.9375,-.25,-2.04],
// 4 84 26.5 -.25 8 -26.5 -.25 8 -5.625 -.25 4.94 5.625 -.25 4.94
  [4,84,26.5,-.25,8,-26.5,-.25,8,-5.625,-.25,4.94,5.625,-.25,4.94],
// 4 84 5.625 -.25 4.94 -5.625 -.25 4.94 -4.9575 -.25 4.85 4.9575 -.25 4.85
  [4,84,5.625,-.25,4.94,-5.625,-.25,4.94,-4.9575,-.25,4.85,4.9575,-.25,4.85],
// 4 84 4.9575 -.25 4.85 -4.9575 -.25 4.85 -4.3125 -.25 4.65 4.3125 -.25 4.65
  [4,84,4.9575,-.25,4.85,-4.9575,-.25,4.85,-4.3125,-.25,4.65,4.3125,-.25,4.65],
// 4 84 4.3125 -.25 4.65 -4.3125 -.25 4.65 -3.72 -.25 4.28 3.72 -.25 4.28
  [4,84,4.3125,-.25,4.65,-4.3125,-.25,4.65,-3.72,-.25,4.28,3.72,-.25,4.28],
// 4 84 3.72 -.25 4.28 -3.72 -.25 4.28 -3.225 -.25 3.73 3.225 -.25 3.73
  [4,84,3.72,-.25,4.28,-3.72,-.25,4.28,-3.225,-.25,3.73,3.225,-.25,3.73],
// 3 84 2.91 -.25 3.02 -2.91 -.25 3.02 0 -.25 -1.56
  [3,84,2.91,-.25,3.02,-2.91,-.25,3.02,0,-.25,-1.56],
// 4 84 3.225 -.25 3.73 -3.225 -.25 3.73 -2.91 -.25 3.02 2.91 -.25 3.02
  [4,84,3.225,-.25,3.73,-3.225,-.25,3.73,-2.91,-.25,3.02,2.91,-.25,3.02],
// 4 84 -26.5 -.25 -8 -3.99 -.25 -4.42 -4.59 -.25 -4.16 -6.09 -.25 -3.95
  [4,84,-26.5,-.25,-8,-3.99,-.25,-4.42,-4.59,-.25,-4.16,-6.09,-.25,-3.95],
// 3 84 6.09 -.25 -3.95 5.3325 -.25 -4.36 26.5 -.25 -8
  [3,84,6.09,-.25,-3.95,5.3325,-.25,-4.36,26.5,-.25,-8],
// 3 84 5.3325 -.25 -4.36 4.5675 -.25 -4.54 26.5 -.25 -8
  [3,84,5.3325,-.25,-4.36,4.5675,-.25,-4.54,26.5,-.25,-8],
// 3 84 -3.99 -.25 -4.42 -26.5 -.25 -8 -3.2175 -.25 -4.58
  [3,84,-3.99,-.25,-4.42,-26.5,-.25,-8,-3.2175,-.25,-4.58],
// 3 84 4.5675 -.25 -4.54 3.945 -.25 -4.55 26.5 -.25 -8
  [3,84,4.5675,-.25,-4.54,3.945,-.25,-4.55,26.5,-.25,-8],
// 3 84 -26.5 -.25 -8 26.5 -.25 -8 -.8175 -.25 -4.57
  [3,84,-26.5,-.25,-8,26.5,-.25,-8,-.8175,-.25,-4.57],
// 4 84 -1.7175 -.25 -4.43 -3.2175 -.25 -4.58 -26.5 -.25 -8 -.8175 -.25 -4.57
  [4,84,-1.7175,-.25,-4.43,-3.2175,-.25,-4.58,-26.5,-.25,-8,-.8175,-.25,-4.57],
// 4 84 .6075 -.25 -4.43 -.8175 -.25 -4.57 26.5 -.25 -8 1.8825 -.25 -4.56
  [4,84,.6075,-.25,-4.43,-.8175,-.25,-4.57,26.5,-.25,-8,1.8825,-.25,-4.56],
// 3 82 5.3025 -.25 -3.69 5.1975 -.25 -3.29 4.905 -.25 -3.92
  [3,82,5.3025,-.25,-3.69,5.1975,-.25,-3.29,4.905,-.25,-3.92],
// 4 82 4.0425 -.25 -3.98 4.4775 -.25 -4 4.8675 -.25 -2.59 4.4475 -.25 -2.23
  [4,82,4.0425,-.25,-3.98,4.4775,-.25,-4,4.8675,-.25,-2.59,4.4475,-.25,-2.23],
// 3 82 3.645 -.25 -3.77 4.0425 -.25 -3.98 4.4475 -.25 -2.23
  [3,82,3.645,-.25,-3.77,4.0425,-.25,-3.98,4.4475,-.25,-2.23],
// 4 82 4.4475 -.25 -2.23 3.8775 -.25 -2.03 3.33 -.25 -3.4 3.645 -.25 -3.77
  [4,82,4.4475,-.25,-2.23,3.8775,-.25,-2.03,3.33,-.25,-3.4,3.645,-.25,-3.77],
// 3 82 3.06 -.25 -2.98 3.33 -.25 -3.4 3.8775 -.25 -2.03
  [3,82,3.06,-.25,-2.98,3.33,-.25,-3.4,3.8775,-.25,-2.03],
// 4 82 2.7075 -.25 -2.11 3.06 -.25 -2.98 3.8775 -.25 -2.03 3.285 -.25 -1.97
  [4,82,2.7075,-.25,-2.11,3.06,-.25,-2.98,3.8775,-.25,-2.03,3.285,-.25,-1.97],
// 4 82 5.6925 -.25 -3.47 6.0525 -.25 -3.32 6.165 -.25 -2.34 5.37 -.25 -2.61
  [4,82,5.6925,-.25,-3.47,6.0525,-.25,-3.32,6.165,-.25,-2.34,5.37,-.25,-2.61],
// 4 82 -4.7325 -.25 -3.58 -5.175 -.25 -2.63 -6.165 -.25 -2.34 -6.0525 -.25 -3.32
  [4,82,-4.7325,-.25,-3.58,-5.175,-.25,-2.63,-6.165,-.25,-2.34,-6.0525,-.25,-3.32],
// 4 82 -4.7625 -.25 -2.27 -4.71 -.25 -2.62 -4.4925 -.25 -3.15 -4.4625 -.25 -2.16
  [4,82,-4.7625,-.25,-2.27,-4.71,-.25,-2.62,-4.4925,-.25,-3.15,-4.4625,-.25,-2.16],
// 4 82 -3.2925 -.25 -4.02 -3.18 -.25 -2.05 -3.7275 -.25 -2.03 -3.7575 -.25 -3.89
  [4,82,-3.2925,-.25,-4.02,-3.18,-.25,-2.05,-3.7275,-.25,-2.03,-3.7575,-.25,-3.89],
// 3 82 -2.7525 -.25 -2.18 -3.18 -.25 -2.05 -3.2925 -.25 -4.02
  [3,82,-2.7525,-.25,-2.18,-3.18,-.25,-2.05,-3.2925,-.25,-4.02],
// 4 82 -2.7525 -.25 -2.18 -3.2925 -.25 -4.02 -2.805 -.25 -4.05 -2.5275 -.25 -2.44
  [4,82,-2.7525,-.25,-2.18,-3.2925,-.25,-4.02,-2.805,-.25,-4.05,-2.5275,-.25,-2.44],
// 3 82 -1.815 -.25 -3.81 -2.2875 -.25 -3 -2.175 -.25 -3.97
  [3,82,-1.815,-.25,-3.81,-2.2875,-.25,-3,-2.175,-.25,-3.97],
// 4 82 -2.5275 -.25 -2.44 -2.805 -.25 -4.05 -2.175 -.25 -3.97 -2.2875 -.25 -3
  [4,82,-2.5275,-.25,-2.44,-2.805,-.25,-4.05,-2.175,-.25,-3.97,-2.2875,-.25,-3],
// 3 82 -4.185 -.25 -3.6 -3.7575 -.25 -3.89 -3.7275 -.25 -2.03
  [3,82,-4.185,-.25,-3.6,-3.7575,-.25,-3.89,-3.7275,-.25,-2.03],
// 4 82 -2.1825 -.25 -2.2 -1.6725 -.25 -3.29 -1.365 -.25 -2.01 -1.8 -.25 -2.05
  [4,82,-2.1825,-.25,-2.2,-1.6725,-.25,-3.29,-1.365,-.25,-2.01,-1.8,-.25,-2.05],
// 3 82 -.1125 -.25 -2.36 -.51 -.25 -2.14 -.9075 -.25 -3.96
  [3,82,-.1125,-.25,-2.36,-.51,-.25,-2.14,-.9075,-.25,-3.96],
// 3 82 .615 -.25 -3.85 .1575 -.25 -2.77 -.4275 -.25 -4.05
  [3,82,.615,-.25,-3.85,.1575,-.25,-2.77,-.4275,-.25,-4.05],
// 4 82 .1575 -.25 -2.77 -.1125 -.25 -2.36 -.9075 -.25 -3.96 -.4275 -.25 -4.05
  [4,82,.1575,-.25,-2.77,-.1125,-.25,-2.36,-.9075,-.25,-3.96,-.4275,-.25,-4.05],
// 4 82 -.9375 -.25 -2.04 -1.3275 -.25 -3.69 -.9075 -.25 -3.96 -.51 -.25 -2.14
  [4,82,-.9375,-.25,-2.04,-1.3275,-.25,-3.69,-.9075,-.25,-3.96,-.51,-.25,-2.14],
// 4 82 .2625 -.25 -2.2 .78 -.25 -3.29 1.08 -.25 -2.01 .645 -.25 -2.05
  [4,82,.2625,-.25,-2.2,.78,-.25,-3.29,1.08,-.25,-2.01,.645,-.25,-2.05],
// 4 82 1.125 -.25 -3.69 1.5075 -.25 -2.04 1.08 -.25 -2.01 .78 -.25 -3.29
  [4,82,1.125,-.25,-3.69,1.5075,-.25,-2.04,1.08,-.25,-2.01,.78,-.25,-3.29],
// 4 82 2.3325 -.25 -2.36 2.0175 -.25 -4.05 3.06 -.25 -3.85 2.6025 -.25 -2.77
  [4,82,2.3325,-.25,-2.36,2.0175,-.25,-4.05,3.06,-.25,-3.85,2.6025,-.25,-2.77],
// 4 82 1.9425 -.25 -2.14 1.5375 -.25 -3.96 2.0175 -.25 -4.05 2.3325 -.25 -2.36
  [4,82,1.9425,-.25,-2.14,1.5375,-.25,-3.96,2.0175,-.25,-4.05,2.3325,-.25,-2.36],
// 4 82 1.5075 -.25 -2.04 1.125 -.25 -3.69 1.5375 -.25 -3.96 1.9425 -.25 -2.14
  [4,82,1.5075,-.25,-2.04,1.125,-.25,-3.69,1.5375,-.25,-3.96,1.9425,-.25,-2.14],
];
module ldraw_lib__6521012a(step=0, col=false, unit=2/5, alt=false, line=0.2, solid=!$preview)
    makepoly(ldraw_lib__6521012a(), step=step, col=col, unit=unit, alt=alt, line=line, solid=solid);
ldraw_lib__6521012a(line=0.2);
